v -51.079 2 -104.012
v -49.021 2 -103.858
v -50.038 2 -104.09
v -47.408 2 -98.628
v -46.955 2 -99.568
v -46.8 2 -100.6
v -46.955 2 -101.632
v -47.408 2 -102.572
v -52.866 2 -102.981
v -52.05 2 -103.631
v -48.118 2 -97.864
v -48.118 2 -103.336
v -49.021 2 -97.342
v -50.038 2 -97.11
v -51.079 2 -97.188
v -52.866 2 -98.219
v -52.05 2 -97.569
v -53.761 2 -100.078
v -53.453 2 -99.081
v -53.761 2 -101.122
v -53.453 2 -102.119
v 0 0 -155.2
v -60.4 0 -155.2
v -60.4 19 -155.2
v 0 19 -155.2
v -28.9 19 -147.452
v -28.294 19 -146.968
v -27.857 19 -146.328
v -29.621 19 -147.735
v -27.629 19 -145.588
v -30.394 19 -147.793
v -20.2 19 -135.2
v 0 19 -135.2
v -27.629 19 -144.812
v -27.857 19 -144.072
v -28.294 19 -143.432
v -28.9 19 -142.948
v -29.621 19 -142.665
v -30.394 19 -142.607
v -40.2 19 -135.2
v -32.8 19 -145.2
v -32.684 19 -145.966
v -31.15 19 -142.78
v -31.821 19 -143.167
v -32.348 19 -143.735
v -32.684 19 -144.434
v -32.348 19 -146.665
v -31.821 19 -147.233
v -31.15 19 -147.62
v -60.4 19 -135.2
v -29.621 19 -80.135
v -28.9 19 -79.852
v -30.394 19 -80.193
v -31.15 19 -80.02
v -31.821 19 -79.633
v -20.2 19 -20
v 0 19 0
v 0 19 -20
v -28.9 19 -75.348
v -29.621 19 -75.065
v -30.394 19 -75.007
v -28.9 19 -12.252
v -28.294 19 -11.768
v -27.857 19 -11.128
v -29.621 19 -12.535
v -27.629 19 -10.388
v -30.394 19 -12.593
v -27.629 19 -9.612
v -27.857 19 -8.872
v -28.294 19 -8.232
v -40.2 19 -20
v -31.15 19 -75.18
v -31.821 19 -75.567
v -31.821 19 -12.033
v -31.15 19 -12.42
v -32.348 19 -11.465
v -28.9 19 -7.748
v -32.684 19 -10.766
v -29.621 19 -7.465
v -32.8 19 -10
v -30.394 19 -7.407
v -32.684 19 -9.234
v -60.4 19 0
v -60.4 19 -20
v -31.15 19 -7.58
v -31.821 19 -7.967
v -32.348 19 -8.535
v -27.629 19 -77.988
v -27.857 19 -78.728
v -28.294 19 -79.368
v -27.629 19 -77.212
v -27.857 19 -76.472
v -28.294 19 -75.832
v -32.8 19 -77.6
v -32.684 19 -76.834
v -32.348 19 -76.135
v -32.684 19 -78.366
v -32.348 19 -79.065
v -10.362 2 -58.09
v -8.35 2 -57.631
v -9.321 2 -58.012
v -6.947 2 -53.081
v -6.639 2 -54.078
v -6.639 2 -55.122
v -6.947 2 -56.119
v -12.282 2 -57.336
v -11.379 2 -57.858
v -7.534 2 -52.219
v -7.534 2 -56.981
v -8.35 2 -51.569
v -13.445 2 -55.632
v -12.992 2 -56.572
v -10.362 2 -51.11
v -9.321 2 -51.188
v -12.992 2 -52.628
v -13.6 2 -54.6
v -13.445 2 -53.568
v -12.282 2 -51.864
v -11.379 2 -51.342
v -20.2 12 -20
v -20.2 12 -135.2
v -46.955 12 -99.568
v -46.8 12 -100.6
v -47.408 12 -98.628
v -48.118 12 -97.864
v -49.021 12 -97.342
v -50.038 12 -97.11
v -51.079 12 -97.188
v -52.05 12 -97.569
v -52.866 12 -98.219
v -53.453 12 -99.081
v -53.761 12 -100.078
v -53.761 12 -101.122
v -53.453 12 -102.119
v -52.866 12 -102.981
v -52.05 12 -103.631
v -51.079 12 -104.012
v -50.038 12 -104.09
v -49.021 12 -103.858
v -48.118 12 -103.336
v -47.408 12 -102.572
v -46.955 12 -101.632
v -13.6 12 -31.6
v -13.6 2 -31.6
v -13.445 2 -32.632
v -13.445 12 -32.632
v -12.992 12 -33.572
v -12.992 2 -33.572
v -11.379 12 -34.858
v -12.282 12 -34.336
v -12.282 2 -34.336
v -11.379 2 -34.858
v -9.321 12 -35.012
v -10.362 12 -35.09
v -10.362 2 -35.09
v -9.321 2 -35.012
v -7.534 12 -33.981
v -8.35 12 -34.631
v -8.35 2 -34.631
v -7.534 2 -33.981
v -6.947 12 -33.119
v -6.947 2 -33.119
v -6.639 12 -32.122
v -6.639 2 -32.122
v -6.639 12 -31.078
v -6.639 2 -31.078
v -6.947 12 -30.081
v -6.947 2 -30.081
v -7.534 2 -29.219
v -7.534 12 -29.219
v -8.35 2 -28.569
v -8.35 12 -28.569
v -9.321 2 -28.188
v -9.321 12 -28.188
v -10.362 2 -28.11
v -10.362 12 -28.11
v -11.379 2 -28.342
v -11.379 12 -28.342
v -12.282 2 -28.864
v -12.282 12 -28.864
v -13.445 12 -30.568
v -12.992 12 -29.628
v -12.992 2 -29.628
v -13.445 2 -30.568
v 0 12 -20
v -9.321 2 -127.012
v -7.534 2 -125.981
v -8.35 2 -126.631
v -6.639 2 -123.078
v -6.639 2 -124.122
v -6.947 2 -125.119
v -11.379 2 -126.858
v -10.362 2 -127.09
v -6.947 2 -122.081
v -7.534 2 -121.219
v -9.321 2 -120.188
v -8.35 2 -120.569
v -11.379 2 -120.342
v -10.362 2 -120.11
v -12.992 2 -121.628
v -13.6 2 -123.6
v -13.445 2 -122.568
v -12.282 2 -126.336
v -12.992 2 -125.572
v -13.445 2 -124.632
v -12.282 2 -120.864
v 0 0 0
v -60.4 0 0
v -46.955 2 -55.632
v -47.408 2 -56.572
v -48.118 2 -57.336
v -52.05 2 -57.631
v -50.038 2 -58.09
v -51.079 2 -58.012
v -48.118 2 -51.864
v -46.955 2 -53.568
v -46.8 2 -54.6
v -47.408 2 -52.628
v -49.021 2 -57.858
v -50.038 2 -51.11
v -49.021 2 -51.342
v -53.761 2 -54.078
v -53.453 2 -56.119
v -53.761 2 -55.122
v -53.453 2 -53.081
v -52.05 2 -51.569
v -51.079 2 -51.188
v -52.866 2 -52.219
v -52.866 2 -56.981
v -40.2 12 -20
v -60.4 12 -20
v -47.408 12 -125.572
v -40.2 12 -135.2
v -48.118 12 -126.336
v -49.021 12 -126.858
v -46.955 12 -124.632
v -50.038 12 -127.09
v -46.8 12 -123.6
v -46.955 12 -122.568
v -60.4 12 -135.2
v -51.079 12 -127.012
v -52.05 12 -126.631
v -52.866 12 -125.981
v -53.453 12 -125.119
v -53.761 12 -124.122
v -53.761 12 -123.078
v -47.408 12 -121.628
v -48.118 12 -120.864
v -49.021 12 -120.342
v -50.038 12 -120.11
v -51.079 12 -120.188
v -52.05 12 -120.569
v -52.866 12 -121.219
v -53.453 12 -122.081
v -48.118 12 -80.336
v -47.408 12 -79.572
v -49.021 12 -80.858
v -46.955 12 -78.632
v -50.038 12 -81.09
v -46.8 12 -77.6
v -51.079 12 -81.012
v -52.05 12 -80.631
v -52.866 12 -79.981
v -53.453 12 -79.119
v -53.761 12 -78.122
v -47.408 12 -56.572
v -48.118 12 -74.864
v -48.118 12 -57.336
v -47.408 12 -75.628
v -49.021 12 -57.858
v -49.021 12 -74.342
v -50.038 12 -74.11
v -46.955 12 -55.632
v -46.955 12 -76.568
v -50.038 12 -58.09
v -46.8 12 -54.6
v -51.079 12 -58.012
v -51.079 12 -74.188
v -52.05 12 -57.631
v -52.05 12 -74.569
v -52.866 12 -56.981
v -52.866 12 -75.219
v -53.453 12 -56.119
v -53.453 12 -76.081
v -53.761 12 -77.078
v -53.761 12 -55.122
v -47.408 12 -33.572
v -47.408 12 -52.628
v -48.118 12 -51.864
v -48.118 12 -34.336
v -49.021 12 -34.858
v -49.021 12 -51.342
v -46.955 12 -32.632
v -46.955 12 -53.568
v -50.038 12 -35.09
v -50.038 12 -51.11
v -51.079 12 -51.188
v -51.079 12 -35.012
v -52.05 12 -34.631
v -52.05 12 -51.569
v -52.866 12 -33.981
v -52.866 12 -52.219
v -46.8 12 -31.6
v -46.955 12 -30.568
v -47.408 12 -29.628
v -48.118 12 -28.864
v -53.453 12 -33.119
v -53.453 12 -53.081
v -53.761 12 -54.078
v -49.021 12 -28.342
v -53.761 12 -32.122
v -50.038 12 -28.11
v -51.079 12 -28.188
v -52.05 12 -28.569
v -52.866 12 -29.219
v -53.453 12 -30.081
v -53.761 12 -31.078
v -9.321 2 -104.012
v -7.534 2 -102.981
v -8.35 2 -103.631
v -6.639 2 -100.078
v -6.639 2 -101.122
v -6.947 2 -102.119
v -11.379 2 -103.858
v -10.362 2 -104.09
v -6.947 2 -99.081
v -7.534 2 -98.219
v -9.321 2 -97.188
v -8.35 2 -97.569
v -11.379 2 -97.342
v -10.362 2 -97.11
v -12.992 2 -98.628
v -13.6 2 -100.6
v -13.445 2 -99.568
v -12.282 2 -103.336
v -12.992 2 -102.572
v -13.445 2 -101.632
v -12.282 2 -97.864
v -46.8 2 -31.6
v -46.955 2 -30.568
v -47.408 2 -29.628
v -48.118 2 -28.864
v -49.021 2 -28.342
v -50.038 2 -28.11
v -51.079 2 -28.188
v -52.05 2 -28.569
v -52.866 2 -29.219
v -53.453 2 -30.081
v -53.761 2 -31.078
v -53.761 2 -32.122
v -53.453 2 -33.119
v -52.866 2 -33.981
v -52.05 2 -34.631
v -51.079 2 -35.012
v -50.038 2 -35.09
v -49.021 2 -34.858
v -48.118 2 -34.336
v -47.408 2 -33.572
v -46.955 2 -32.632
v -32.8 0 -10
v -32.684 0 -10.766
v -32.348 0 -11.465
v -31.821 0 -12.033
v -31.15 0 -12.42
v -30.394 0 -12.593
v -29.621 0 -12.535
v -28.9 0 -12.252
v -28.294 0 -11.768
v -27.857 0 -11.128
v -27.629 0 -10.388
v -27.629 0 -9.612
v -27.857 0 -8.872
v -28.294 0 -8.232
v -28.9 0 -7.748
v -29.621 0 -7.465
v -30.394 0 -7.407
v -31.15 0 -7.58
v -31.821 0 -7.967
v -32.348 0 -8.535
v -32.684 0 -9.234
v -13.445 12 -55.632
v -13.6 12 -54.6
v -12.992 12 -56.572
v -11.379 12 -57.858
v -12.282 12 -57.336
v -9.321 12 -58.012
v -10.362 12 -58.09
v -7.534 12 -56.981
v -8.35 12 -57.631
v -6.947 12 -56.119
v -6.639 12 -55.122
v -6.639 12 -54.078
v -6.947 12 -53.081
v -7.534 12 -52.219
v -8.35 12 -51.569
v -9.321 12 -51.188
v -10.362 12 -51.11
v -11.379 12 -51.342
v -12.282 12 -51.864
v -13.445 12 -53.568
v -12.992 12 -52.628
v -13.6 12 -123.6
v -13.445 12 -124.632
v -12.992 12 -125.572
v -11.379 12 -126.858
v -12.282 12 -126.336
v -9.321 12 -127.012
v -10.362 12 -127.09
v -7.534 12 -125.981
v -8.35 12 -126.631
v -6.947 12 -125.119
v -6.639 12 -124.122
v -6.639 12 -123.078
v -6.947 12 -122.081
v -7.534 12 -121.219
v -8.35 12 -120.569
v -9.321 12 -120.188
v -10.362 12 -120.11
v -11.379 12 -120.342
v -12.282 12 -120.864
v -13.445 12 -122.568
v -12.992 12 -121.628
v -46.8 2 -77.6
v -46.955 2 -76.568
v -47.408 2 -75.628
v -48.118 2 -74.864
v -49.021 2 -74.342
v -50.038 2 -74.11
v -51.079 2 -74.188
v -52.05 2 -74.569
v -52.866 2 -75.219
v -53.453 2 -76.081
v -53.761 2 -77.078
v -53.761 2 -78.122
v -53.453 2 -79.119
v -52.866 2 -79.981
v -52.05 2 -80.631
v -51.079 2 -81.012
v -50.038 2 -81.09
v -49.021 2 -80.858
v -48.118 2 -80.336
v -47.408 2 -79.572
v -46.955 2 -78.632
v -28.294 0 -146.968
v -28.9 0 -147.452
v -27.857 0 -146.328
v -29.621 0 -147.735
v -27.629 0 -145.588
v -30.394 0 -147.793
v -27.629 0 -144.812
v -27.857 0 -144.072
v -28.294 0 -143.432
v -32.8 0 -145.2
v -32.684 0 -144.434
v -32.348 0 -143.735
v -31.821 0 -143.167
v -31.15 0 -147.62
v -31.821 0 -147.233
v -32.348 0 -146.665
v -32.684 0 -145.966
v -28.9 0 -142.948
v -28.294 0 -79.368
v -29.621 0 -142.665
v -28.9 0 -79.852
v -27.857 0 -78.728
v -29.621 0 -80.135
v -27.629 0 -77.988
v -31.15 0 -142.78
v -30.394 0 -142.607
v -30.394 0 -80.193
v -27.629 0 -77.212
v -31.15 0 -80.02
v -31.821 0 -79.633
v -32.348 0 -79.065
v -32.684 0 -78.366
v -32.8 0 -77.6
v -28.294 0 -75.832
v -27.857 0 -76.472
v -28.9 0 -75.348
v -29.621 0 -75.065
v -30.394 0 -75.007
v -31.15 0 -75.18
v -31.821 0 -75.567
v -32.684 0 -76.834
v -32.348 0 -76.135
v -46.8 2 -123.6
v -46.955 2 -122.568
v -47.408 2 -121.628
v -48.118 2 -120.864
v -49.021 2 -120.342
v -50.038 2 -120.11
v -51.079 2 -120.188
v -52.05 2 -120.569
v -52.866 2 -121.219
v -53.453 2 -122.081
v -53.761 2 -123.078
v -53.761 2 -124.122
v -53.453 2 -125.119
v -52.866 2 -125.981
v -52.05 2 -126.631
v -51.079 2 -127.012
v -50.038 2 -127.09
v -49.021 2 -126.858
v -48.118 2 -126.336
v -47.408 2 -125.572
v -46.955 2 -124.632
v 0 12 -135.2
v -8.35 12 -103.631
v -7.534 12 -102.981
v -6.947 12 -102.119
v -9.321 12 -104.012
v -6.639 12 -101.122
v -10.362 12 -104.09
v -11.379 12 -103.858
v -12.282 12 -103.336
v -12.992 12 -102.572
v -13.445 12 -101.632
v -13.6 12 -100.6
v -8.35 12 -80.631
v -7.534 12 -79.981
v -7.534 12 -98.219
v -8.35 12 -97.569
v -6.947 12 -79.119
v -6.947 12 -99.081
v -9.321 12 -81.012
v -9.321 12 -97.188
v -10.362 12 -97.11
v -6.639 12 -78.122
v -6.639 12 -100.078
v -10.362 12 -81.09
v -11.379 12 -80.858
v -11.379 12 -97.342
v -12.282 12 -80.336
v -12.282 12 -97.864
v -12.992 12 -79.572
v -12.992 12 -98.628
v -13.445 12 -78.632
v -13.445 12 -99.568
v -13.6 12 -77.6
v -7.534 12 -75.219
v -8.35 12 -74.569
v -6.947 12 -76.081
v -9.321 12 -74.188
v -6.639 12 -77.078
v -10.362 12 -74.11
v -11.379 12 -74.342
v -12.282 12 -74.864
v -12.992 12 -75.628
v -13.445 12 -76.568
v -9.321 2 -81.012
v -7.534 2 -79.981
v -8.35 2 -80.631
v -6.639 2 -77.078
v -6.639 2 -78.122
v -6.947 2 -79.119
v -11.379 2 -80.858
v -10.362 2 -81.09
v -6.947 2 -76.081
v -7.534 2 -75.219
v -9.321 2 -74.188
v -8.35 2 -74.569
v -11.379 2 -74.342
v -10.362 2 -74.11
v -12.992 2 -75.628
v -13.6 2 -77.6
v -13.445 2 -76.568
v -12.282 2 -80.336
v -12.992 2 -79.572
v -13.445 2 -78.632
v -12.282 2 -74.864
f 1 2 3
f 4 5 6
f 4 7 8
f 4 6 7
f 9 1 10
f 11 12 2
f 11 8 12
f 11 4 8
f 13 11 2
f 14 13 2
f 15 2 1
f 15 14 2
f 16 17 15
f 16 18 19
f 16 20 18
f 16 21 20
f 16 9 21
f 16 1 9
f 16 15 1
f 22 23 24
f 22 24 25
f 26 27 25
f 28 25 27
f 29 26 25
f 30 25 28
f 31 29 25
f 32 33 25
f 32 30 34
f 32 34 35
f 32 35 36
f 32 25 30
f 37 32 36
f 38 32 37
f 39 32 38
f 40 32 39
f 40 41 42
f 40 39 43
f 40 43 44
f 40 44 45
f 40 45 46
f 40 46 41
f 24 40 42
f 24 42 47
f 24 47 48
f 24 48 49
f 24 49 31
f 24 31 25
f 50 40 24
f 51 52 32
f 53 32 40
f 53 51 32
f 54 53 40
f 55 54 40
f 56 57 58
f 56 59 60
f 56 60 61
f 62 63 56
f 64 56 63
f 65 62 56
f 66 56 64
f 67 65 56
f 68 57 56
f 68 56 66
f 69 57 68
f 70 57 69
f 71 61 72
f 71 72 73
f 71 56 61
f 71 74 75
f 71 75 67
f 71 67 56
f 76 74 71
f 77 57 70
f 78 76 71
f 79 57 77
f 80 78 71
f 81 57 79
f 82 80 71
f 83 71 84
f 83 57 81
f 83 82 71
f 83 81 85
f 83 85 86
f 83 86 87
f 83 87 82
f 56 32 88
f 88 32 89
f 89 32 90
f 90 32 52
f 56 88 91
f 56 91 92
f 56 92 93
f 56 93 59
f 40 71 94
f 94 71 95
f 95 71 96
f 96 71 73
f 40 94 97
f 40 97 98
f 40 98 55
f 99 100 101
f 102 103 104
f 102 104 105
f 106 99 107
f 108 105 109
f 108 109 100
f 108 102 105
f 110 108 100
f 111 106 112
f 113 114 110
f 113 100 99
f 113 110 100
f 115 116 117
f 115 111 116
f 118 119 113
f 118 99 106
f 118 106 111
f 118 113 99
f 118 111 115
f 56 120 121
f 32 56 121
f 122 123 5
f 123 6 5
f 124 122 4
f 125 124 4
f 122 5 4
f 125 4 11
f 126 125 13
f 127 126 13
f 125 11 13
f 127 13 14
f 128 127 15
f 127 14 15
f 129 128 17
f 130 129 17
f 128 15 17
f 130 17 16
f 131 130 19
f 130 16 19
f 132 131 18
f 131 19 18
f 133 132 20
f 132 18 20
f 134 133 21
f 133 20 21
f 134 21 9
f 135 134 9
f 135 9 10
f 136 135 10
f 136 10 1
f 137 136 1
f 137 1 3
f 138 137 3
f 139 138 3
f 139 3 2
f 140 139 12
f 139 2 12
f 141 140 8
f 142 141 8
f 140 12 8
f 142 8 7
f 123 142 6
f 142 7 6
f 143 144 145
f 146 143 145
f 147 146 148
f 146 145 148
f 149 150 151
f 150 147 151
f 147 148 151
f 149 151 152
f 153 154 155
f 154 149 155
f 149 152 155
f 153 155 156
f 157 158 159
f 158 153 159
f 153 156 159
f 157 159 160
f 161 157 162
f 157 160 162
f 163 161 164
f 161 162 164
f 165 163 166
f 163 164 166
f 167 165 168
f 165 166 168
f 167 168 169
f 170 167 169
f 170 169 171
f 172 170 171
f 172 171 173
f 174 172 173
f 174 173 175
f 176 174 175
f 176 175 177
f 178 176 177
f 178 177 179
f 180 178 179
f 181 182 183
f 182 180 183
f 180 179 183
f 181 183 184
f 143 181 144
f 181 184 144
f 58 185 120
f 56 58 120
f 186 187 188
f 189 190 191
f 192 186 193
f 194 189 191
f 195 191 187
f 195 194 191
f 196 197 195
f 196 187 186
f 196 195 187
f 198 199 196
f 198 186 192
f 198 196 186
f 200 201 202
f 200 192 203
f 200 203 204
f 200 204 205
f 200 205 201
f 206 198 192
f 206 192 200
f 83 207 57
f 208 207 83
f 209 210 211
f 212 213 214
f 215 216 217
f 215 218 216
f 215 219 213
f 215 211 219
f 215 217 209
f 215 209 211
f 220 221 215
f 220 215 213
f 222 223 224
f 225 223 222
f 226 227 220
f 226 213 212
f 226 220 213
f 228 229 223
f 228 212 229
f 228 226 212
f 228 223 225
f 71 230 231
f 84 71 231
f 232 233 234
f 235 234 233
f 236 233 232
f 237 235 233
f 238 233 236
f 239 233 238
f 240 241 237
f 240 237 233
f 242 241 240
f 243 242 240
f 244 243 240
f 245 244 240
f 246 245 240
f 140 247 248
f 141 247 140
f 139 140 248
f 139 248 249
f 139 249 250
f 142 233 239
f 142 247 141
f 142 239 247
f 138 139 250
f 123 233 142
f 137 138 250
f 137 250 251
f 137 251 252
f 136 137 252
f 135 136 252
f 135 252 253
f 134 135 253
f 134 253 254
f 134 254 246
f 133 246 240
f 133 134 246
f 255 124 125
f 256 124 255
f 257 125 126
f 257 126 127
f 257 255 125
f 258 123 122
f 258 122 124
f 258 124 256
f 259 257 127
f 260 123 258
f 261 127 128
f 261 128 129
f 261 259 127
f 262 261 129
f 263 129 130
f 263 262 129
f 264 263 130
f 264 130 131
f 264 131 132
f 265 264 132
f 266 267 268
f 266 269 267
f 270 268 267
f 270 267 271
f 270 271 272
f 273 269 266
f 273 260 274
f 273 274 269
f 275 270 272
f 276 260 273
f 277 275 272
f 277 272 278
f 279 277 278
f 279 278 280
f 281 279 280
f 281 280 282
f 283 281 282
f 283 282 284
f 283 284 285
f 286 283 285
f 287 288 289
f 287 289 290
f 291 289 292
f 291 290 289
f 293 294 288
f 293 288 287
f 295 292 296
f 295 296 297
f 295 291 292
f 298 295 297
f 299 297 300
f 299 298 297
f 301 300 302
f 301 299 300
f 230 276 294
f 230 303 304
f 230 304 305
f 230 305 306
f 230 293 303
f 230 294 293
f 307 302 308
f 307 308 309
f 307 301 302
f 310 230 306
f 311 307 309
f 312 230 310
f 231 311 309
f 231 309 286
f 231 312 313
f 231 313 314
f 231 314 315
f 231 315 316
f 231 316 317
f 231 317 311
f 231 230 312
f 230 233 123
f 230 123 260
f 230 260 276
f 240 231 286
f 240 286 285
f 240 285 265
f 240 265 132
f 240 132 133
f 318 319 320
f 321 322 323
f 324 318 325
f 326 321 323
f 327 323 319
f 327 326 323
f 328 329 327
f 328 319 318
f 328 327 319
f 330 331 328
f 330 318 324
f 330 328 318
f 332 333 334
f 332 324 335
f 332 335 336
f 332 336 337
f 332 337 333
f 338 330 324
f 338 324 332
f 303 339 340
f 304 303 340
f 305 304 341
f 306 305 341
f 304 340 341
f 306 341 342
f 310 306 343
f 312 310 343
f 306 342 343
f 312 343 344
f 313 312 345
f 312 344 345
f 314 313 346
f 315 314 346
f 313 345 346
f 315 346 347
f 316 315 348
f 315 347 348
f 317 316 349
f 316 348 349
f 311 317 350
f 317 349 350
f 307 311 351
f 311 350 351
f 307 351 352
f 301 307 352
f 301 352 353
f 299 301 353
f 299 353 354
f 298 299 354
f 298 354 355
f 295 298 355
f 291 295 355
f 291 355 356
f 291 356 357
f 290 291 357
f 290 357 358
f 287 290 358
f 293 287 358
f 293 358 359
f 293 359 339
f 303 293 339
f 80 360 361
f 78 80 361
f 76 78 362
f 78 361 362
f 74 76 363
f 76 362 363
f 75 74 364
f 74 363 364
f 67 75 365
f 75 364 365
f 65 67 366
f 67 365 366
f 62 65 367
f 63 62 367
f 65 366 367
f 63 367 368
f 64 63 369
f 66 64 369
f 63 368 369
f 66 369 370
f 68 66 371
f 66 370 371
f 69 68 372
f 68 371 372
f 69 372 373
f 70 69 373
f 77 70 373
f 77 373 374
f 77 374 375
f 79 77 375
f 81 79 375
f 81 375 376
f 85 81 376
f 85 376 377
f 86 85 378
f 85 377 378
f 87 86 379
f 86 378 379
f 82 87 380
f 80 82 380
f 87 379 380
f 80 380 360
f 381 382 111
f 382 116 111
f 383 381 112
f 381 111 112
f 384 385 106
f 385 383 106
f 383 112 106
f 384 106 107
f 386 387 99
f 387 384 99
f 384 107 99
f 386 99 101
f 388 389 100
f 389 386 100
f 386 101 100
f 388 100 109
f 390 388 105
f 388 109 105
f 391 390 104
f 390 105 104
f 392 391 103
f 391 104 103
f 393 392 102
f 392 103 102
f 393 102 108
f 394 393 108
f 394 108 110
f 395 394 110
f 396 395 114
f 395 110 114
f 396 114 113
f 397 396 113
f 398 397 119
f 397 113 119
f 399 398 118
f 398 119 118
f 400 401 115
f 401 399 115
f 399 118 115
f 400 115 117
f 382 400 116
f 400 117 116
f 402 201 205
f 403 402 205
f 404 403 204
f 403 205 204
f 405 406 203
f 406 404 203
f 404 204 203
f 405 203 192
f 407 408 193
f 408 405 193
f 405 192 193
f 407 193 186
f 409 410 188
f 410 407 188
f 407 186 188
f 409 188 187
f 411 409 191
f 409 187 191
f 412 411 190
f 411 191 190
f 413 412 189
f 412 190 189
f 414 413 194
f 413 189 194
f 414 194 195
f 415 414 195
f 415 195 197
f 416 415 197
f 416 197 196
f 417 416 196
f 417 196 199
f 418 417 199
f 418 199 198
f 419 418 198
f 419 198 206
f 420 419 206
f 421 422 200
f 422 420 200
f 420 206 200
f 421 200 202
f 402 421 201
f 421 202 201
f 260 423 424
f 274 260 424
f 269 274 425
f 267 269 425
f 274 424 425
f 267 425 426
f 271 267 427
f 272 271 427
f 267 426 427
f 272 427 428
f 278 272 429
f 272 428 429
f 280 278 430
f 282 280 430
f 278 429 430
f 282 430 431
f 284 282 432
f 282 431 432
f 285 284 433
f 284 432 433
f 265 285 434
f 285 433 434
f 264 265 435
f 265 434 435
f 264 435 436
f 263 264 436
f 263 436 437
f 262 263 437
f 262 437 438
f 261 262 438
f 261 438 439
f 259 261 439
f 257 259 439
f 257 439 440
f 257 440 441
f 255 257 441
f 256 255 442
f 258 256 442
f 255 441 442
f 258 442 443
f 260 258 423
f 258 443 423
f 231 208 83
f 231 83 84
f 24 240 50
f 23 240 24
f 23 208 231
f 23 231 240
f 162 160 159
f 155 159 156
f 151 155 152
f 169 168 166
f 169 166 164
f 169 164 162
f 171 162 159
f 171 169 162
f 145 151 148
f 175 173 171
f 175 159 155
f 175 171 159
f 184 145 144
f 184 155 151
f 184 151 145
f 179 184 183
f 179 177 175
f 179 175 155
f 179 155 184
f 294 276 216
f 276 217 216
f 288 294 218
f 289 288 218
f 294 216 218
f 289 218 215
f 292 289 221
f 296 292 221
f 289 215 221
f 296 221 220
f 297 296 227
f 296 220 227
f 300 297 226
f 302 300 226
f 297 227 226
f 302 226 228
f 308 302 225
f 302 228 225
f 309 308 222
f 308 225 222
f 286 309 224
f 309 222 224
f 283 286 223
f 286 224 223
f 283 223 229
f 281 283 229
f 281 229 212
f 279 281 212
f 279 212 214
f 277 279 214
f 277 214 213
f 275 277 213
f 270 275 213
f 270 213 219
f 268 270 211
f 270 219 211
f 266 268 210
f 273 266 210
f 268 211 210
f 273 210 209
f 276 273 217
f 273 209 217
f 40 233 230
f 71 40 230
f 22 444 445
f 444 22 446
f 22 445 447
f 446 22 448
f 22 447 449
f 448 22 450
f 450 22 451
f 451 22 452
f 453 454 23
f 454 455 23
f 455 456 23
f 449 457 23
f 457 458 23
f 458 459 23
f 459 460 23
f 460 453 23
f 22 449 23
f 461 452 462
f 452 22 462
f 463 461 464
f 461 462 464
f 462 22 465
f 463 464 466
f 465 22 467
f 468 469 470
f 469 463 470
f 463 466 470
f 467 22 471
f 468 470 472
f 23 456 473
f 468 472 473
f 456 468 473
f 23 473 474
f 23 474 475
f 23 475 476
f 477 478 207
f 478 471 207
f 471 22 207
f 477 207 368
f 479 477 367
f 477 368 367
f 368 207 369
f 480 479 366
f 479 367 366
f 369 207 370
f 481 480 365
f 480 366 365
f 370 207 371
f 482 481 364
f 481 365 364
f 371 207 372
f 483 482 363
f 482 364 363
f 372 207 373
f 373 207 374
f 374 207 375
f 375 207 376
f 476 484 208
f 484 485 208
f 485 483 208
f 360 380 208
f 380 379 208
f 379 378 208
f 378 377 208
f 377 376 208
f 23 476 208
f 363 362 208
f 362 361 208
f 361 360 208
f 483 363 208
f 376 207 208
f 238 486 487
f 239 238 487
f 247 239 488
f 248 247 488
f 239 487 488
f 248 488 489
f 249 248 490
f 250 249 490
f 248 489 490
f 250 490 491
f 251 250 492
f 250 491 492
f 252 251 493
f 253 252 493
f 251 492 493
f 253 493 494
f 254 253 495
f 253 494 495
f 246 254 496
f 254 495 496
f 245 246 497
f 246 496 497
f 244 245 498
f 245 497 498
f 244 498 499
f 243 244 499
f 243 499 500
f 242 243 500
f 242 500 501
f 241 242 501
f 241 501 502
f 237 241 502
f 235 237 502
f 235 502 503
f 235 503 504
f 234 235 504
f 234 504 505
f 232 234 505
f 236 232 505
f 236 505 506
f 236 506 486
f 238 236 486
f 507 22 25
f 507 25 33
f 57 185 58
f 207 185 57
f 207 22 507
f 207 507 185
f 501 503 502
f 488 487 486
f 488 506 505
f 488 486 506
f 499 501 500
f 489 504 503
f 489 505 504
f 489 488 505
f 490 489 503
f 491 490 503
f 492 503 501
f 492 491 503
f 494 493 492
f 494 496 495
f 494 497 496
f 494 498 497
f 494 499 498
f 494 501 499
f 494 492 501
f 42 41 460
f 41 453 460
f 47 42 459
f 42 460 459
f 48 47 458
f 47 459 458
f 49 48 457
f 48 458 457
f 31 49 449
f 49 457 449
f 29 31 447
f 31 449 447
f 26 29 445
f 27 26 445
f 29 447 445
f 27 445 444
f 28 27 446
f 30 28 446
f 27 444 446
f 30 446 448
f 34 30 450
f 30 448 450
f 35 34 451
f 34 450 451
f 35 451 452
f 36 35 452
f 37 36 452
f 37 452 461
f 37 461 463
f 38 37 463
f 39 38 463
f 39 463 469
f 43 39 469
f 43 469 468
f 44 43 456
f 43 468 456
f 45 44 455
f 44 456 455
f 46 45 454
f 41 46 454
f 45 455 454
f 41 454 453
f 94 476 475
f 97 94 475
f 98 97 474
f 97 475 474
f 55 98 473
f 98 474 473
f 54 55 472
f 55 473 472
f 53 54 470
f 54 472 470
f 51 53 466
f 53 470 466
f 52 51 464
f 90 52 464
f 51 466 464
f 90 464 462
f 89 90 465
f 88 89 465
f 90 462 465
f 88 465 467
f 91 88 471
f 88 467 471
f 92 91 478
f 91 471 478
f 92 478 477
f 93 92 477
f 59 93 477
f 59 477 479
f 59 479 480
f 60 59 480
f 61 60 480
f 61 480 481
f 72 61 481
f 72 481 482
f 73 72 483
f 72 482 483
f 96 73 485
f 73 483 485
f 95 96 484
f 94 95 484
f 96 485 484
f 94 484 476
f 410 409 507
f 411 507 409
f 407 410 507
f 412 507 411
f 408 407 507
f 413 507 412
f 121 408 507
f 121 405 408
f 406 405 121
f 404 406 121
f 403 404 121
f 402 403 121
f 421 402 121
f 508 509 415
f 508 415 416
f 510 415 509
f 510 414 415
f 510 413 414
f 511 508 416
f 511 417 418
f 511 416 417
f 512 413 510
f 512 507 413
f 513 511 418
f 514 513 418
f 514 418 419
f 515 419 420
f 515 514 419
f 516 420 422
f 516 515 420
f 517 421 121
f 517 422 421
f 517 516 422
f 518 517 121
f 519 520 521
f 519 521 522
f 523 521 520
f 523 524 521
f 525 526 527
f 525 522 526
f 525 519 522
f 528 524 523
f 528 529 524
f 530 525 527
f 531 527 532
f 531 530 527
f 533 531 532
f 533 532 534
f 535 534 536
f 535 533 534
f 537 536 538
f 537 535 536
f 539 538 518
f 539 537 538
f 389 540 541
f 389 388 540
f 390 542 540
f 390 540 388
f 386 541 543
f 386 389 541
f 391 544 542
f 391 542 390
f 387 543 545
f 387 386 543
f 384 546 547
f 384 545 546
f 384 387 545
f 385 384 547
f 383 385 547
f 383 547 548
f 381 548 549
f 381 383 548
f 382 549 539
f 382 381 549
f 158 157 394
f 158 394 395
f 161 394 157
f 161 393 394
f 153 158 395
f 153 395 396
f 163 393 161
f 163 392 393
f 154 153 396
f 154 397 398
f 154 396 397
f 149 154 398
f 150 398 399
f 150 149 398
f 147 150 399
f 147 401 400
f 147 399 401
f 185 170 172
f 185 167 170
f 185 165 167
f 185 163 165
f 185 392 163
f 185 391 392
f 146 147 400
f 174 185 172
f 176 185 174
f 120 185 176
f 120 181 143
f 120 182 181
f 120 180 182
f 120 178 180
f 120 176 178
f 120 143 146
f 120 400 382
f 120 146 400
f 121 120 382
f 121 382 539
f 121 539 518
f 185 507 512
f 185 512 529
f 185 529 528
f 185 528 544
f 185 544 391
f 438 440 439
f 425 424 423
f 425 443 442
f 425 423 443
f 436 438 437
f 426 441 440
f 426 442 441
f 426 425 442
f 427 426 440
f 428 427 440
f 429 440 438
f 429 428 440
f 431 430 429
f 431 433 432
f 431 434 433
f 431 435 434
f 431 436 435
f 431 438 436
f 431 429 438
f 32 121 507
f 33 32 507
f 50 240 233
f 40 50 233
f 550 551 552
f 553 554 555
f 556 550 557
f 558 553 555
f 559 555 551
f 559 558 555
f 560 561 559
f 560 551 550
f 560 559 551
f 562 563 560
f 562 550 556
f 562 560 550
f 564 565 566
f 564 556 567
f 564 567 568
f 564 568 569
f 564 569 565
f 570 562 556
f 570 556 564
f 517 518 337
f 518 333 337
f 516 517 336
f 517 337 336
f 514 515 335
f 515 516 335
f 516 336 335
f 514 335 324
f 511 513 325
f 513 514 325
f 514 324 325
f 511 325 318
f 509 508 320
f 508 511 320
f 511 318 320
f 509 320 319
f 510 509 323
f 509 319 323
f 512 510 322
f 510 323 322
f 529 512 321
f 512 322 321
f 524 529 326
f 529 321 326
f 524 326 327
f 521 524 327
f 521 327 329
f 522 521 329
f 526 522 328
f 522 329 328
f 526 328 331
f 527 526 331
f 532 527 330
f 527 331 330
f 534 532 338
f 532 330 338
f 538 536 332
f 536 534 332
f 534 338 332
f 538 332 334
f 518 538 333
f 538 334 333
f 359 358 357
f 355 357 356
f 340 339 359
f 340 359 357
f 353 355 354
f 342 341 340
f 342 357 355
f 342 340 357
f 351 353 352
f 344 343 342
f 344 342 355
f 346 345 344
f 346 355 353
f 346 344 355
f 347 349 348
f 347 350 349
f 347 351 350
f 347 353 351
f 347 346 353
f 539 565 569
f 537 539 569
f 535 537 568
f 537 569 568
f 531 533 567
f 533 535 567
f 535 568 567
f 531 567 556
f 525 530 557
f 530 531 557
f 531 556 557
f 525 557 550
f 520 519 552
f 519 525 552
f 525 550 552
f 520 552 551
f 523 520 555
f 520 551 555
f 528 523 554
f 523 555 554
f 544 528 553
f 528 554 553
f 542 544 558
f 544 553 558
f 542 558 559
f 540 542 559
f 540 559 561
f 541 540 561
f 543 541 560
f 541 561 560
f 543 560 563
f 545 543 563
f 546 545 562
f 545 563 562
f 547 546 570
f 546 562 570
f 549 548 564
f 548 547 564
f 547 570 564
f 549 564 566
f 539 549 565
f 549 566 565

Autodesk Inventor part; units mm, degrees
ref_plane "YZ Plane" through (0, 0, 0) normal (1, 0, 0) x (0, 1, 0)
ref_plane "XZ Plane" through (0, 0, 0) normal (0, 1, 0) x (-1, 0, 0)
sketch "Sketch1" plane through (0, 0, 0) normal (0, 1, 0) x (-1, 0, 0)
  line L0 (0, 0) -> (40.2, 0)
  line L1 (40.2, 0) -> (40.2, -155.2)
  line L2 (40.2, -155.2) -> (0, -155.2)
  line L3 (0, -155.2) -> (0, 0)
  line L4 (0, -20) -> (20.2, -20)
  line L5 (20.2, -20) -> (20.2, -135.2)
  line L6 (20.2, -135.2) -> (0, -135.2)
  line L7 (0, -135.2) -> (0, -20)
  line L8 (10.1, -135.2) -> (10.1, -20) construction
  line L9 (20.2, -77.6) -> (0, -77.6) construction
  circle A0 centre (10.1, -77.6) radius 3.5
  line L10 (0, -54.6) -> (20.2, -54.6) construction
  line L11 (20.2, -31.6) -> (0, -31.6) construction
  circle A1 centre (10.1, -54.6) radius 3.5
  circle A2 centre (10.1, -31.6) radius 3.5
  circle A3 centre (10.1, -100.6) radius 3.5
  circle A4 centre (10.1, -123.6) radius 3.5
  line L12 (40.2, -155.2) -> (20.2, -135.2) construction
  line L13 (30.2, -155.2) -> (30.2, 0) construction
  line L14 (20.2, -20) -> (40.2, 0) construction
  circle A5 centre (30.2, -145.2) radius 2.6
  circle A6 centre (30.2, -10) radius 2.6
  circle A7 centre (30.2, -77.6) radius 2.6
  point P0 (0, -135.2)
  dimension "d0" = 115.2
  dimension "d1" = 20.2
  dimension "d2" = 7
  dimension "d3" = 23
  dimension "d4" = 23
  dimension "d11" = 20
  dimension "d12" = 20
  dimension "d13" = 20
  dimension "d14" = 5.2
extrude "Extrusion1" add sketch "Sketch1" along normal blind 12 contours L4 L5 L6 L3
extrude "Extrusion2" add sketch "Sketch1" along normal blind 2 contours A0 | A1 | A2 | A3 | A4
extrude "Extrusion3" add sketch "Sketch1" along normal blind 19 contours L0 L1 L2 L3 L6 L5 L4
sketch "Sketch2" plane through (0, 19, 0) normal (0, 1, 0) x (1, 0, 0)
  line L0 (-40.2, 155.2) -> (-40.2, 0) projected
  line L1 (-40.2, 0) -> (0, 0) projected
  line L2 (0, 0) -> (0, 20) projected
  line L3 (0, 20) -> (-20.2, 20) projected
  line L4 (-20.2, 20) -> (-20.2, 135.2) projected
  line L5 (-20.2, 135.2) -> (0, 135.2) projected
  line L6 (0, 135.2) -> (0, 155.2) projected
  line L7 (0, 155.2) -> (-40.2, 155.2) projected
  circle A0 centre (-30.2, 77.6) radius 2.6 projected
  circle A1 centre (-30.2, 145.2) radius 2.6 projected
  circle A2 centre (-30.2, 10) radius 2.6 projected
  line L8 (-30.2, 10) -> (-30.2, 145.2)
ref_plane "Work Plane1" through (-30.2, 19, -10) normal (1, 0, 0) x (0, 0, -1)
mirror "Mirror1" about plane through (-30.2, 19, -10) normal (1, 0, 0) of "Extrusion3", "Extrusion2", "Extrusion1"
equation "\"d1\" = screwTabWidth + tolerance"
equation "\"d2\" = insertDiameter"
equation "\"d11\" = screwTabWidth"
equation "\"d12\" = screwTabWidth"
equation "\"d13\" = screwTabWidth"
equation "\"d14\" = screwDiameter + tolerance"
equation "\"d5\" = insertPadding + insertLength"
equation "\"d7\" = insertPadding"
equation "\"d9\" = insertLength + insertPadding + baseThickness"
equation "\"insertDiameter\" = 7"
equation "\"insertLength\" = 10"
equation "\"insertPadding\" = 2"
equation "\"tolerance\" = 0.2"
equation "\"cellSpacing_1\" = 1"
equation "\"screwDiameter_1\" = 5"
equation "\"baseThickness_1\" = 7"
equation "\"tabThickness_1\" = 0.8"
equation "\"batteryBoxWidth\" = 162"
equation "\"sheetMetalThickness\" = 3.175"
equation "\"screwTabWidth\" = 20"
equation "\"screwDiameter\" = 5"
equation "\"baseThickness\" = 7"
properties part number "CO-1-1-CellSpacerMountMiddle"
